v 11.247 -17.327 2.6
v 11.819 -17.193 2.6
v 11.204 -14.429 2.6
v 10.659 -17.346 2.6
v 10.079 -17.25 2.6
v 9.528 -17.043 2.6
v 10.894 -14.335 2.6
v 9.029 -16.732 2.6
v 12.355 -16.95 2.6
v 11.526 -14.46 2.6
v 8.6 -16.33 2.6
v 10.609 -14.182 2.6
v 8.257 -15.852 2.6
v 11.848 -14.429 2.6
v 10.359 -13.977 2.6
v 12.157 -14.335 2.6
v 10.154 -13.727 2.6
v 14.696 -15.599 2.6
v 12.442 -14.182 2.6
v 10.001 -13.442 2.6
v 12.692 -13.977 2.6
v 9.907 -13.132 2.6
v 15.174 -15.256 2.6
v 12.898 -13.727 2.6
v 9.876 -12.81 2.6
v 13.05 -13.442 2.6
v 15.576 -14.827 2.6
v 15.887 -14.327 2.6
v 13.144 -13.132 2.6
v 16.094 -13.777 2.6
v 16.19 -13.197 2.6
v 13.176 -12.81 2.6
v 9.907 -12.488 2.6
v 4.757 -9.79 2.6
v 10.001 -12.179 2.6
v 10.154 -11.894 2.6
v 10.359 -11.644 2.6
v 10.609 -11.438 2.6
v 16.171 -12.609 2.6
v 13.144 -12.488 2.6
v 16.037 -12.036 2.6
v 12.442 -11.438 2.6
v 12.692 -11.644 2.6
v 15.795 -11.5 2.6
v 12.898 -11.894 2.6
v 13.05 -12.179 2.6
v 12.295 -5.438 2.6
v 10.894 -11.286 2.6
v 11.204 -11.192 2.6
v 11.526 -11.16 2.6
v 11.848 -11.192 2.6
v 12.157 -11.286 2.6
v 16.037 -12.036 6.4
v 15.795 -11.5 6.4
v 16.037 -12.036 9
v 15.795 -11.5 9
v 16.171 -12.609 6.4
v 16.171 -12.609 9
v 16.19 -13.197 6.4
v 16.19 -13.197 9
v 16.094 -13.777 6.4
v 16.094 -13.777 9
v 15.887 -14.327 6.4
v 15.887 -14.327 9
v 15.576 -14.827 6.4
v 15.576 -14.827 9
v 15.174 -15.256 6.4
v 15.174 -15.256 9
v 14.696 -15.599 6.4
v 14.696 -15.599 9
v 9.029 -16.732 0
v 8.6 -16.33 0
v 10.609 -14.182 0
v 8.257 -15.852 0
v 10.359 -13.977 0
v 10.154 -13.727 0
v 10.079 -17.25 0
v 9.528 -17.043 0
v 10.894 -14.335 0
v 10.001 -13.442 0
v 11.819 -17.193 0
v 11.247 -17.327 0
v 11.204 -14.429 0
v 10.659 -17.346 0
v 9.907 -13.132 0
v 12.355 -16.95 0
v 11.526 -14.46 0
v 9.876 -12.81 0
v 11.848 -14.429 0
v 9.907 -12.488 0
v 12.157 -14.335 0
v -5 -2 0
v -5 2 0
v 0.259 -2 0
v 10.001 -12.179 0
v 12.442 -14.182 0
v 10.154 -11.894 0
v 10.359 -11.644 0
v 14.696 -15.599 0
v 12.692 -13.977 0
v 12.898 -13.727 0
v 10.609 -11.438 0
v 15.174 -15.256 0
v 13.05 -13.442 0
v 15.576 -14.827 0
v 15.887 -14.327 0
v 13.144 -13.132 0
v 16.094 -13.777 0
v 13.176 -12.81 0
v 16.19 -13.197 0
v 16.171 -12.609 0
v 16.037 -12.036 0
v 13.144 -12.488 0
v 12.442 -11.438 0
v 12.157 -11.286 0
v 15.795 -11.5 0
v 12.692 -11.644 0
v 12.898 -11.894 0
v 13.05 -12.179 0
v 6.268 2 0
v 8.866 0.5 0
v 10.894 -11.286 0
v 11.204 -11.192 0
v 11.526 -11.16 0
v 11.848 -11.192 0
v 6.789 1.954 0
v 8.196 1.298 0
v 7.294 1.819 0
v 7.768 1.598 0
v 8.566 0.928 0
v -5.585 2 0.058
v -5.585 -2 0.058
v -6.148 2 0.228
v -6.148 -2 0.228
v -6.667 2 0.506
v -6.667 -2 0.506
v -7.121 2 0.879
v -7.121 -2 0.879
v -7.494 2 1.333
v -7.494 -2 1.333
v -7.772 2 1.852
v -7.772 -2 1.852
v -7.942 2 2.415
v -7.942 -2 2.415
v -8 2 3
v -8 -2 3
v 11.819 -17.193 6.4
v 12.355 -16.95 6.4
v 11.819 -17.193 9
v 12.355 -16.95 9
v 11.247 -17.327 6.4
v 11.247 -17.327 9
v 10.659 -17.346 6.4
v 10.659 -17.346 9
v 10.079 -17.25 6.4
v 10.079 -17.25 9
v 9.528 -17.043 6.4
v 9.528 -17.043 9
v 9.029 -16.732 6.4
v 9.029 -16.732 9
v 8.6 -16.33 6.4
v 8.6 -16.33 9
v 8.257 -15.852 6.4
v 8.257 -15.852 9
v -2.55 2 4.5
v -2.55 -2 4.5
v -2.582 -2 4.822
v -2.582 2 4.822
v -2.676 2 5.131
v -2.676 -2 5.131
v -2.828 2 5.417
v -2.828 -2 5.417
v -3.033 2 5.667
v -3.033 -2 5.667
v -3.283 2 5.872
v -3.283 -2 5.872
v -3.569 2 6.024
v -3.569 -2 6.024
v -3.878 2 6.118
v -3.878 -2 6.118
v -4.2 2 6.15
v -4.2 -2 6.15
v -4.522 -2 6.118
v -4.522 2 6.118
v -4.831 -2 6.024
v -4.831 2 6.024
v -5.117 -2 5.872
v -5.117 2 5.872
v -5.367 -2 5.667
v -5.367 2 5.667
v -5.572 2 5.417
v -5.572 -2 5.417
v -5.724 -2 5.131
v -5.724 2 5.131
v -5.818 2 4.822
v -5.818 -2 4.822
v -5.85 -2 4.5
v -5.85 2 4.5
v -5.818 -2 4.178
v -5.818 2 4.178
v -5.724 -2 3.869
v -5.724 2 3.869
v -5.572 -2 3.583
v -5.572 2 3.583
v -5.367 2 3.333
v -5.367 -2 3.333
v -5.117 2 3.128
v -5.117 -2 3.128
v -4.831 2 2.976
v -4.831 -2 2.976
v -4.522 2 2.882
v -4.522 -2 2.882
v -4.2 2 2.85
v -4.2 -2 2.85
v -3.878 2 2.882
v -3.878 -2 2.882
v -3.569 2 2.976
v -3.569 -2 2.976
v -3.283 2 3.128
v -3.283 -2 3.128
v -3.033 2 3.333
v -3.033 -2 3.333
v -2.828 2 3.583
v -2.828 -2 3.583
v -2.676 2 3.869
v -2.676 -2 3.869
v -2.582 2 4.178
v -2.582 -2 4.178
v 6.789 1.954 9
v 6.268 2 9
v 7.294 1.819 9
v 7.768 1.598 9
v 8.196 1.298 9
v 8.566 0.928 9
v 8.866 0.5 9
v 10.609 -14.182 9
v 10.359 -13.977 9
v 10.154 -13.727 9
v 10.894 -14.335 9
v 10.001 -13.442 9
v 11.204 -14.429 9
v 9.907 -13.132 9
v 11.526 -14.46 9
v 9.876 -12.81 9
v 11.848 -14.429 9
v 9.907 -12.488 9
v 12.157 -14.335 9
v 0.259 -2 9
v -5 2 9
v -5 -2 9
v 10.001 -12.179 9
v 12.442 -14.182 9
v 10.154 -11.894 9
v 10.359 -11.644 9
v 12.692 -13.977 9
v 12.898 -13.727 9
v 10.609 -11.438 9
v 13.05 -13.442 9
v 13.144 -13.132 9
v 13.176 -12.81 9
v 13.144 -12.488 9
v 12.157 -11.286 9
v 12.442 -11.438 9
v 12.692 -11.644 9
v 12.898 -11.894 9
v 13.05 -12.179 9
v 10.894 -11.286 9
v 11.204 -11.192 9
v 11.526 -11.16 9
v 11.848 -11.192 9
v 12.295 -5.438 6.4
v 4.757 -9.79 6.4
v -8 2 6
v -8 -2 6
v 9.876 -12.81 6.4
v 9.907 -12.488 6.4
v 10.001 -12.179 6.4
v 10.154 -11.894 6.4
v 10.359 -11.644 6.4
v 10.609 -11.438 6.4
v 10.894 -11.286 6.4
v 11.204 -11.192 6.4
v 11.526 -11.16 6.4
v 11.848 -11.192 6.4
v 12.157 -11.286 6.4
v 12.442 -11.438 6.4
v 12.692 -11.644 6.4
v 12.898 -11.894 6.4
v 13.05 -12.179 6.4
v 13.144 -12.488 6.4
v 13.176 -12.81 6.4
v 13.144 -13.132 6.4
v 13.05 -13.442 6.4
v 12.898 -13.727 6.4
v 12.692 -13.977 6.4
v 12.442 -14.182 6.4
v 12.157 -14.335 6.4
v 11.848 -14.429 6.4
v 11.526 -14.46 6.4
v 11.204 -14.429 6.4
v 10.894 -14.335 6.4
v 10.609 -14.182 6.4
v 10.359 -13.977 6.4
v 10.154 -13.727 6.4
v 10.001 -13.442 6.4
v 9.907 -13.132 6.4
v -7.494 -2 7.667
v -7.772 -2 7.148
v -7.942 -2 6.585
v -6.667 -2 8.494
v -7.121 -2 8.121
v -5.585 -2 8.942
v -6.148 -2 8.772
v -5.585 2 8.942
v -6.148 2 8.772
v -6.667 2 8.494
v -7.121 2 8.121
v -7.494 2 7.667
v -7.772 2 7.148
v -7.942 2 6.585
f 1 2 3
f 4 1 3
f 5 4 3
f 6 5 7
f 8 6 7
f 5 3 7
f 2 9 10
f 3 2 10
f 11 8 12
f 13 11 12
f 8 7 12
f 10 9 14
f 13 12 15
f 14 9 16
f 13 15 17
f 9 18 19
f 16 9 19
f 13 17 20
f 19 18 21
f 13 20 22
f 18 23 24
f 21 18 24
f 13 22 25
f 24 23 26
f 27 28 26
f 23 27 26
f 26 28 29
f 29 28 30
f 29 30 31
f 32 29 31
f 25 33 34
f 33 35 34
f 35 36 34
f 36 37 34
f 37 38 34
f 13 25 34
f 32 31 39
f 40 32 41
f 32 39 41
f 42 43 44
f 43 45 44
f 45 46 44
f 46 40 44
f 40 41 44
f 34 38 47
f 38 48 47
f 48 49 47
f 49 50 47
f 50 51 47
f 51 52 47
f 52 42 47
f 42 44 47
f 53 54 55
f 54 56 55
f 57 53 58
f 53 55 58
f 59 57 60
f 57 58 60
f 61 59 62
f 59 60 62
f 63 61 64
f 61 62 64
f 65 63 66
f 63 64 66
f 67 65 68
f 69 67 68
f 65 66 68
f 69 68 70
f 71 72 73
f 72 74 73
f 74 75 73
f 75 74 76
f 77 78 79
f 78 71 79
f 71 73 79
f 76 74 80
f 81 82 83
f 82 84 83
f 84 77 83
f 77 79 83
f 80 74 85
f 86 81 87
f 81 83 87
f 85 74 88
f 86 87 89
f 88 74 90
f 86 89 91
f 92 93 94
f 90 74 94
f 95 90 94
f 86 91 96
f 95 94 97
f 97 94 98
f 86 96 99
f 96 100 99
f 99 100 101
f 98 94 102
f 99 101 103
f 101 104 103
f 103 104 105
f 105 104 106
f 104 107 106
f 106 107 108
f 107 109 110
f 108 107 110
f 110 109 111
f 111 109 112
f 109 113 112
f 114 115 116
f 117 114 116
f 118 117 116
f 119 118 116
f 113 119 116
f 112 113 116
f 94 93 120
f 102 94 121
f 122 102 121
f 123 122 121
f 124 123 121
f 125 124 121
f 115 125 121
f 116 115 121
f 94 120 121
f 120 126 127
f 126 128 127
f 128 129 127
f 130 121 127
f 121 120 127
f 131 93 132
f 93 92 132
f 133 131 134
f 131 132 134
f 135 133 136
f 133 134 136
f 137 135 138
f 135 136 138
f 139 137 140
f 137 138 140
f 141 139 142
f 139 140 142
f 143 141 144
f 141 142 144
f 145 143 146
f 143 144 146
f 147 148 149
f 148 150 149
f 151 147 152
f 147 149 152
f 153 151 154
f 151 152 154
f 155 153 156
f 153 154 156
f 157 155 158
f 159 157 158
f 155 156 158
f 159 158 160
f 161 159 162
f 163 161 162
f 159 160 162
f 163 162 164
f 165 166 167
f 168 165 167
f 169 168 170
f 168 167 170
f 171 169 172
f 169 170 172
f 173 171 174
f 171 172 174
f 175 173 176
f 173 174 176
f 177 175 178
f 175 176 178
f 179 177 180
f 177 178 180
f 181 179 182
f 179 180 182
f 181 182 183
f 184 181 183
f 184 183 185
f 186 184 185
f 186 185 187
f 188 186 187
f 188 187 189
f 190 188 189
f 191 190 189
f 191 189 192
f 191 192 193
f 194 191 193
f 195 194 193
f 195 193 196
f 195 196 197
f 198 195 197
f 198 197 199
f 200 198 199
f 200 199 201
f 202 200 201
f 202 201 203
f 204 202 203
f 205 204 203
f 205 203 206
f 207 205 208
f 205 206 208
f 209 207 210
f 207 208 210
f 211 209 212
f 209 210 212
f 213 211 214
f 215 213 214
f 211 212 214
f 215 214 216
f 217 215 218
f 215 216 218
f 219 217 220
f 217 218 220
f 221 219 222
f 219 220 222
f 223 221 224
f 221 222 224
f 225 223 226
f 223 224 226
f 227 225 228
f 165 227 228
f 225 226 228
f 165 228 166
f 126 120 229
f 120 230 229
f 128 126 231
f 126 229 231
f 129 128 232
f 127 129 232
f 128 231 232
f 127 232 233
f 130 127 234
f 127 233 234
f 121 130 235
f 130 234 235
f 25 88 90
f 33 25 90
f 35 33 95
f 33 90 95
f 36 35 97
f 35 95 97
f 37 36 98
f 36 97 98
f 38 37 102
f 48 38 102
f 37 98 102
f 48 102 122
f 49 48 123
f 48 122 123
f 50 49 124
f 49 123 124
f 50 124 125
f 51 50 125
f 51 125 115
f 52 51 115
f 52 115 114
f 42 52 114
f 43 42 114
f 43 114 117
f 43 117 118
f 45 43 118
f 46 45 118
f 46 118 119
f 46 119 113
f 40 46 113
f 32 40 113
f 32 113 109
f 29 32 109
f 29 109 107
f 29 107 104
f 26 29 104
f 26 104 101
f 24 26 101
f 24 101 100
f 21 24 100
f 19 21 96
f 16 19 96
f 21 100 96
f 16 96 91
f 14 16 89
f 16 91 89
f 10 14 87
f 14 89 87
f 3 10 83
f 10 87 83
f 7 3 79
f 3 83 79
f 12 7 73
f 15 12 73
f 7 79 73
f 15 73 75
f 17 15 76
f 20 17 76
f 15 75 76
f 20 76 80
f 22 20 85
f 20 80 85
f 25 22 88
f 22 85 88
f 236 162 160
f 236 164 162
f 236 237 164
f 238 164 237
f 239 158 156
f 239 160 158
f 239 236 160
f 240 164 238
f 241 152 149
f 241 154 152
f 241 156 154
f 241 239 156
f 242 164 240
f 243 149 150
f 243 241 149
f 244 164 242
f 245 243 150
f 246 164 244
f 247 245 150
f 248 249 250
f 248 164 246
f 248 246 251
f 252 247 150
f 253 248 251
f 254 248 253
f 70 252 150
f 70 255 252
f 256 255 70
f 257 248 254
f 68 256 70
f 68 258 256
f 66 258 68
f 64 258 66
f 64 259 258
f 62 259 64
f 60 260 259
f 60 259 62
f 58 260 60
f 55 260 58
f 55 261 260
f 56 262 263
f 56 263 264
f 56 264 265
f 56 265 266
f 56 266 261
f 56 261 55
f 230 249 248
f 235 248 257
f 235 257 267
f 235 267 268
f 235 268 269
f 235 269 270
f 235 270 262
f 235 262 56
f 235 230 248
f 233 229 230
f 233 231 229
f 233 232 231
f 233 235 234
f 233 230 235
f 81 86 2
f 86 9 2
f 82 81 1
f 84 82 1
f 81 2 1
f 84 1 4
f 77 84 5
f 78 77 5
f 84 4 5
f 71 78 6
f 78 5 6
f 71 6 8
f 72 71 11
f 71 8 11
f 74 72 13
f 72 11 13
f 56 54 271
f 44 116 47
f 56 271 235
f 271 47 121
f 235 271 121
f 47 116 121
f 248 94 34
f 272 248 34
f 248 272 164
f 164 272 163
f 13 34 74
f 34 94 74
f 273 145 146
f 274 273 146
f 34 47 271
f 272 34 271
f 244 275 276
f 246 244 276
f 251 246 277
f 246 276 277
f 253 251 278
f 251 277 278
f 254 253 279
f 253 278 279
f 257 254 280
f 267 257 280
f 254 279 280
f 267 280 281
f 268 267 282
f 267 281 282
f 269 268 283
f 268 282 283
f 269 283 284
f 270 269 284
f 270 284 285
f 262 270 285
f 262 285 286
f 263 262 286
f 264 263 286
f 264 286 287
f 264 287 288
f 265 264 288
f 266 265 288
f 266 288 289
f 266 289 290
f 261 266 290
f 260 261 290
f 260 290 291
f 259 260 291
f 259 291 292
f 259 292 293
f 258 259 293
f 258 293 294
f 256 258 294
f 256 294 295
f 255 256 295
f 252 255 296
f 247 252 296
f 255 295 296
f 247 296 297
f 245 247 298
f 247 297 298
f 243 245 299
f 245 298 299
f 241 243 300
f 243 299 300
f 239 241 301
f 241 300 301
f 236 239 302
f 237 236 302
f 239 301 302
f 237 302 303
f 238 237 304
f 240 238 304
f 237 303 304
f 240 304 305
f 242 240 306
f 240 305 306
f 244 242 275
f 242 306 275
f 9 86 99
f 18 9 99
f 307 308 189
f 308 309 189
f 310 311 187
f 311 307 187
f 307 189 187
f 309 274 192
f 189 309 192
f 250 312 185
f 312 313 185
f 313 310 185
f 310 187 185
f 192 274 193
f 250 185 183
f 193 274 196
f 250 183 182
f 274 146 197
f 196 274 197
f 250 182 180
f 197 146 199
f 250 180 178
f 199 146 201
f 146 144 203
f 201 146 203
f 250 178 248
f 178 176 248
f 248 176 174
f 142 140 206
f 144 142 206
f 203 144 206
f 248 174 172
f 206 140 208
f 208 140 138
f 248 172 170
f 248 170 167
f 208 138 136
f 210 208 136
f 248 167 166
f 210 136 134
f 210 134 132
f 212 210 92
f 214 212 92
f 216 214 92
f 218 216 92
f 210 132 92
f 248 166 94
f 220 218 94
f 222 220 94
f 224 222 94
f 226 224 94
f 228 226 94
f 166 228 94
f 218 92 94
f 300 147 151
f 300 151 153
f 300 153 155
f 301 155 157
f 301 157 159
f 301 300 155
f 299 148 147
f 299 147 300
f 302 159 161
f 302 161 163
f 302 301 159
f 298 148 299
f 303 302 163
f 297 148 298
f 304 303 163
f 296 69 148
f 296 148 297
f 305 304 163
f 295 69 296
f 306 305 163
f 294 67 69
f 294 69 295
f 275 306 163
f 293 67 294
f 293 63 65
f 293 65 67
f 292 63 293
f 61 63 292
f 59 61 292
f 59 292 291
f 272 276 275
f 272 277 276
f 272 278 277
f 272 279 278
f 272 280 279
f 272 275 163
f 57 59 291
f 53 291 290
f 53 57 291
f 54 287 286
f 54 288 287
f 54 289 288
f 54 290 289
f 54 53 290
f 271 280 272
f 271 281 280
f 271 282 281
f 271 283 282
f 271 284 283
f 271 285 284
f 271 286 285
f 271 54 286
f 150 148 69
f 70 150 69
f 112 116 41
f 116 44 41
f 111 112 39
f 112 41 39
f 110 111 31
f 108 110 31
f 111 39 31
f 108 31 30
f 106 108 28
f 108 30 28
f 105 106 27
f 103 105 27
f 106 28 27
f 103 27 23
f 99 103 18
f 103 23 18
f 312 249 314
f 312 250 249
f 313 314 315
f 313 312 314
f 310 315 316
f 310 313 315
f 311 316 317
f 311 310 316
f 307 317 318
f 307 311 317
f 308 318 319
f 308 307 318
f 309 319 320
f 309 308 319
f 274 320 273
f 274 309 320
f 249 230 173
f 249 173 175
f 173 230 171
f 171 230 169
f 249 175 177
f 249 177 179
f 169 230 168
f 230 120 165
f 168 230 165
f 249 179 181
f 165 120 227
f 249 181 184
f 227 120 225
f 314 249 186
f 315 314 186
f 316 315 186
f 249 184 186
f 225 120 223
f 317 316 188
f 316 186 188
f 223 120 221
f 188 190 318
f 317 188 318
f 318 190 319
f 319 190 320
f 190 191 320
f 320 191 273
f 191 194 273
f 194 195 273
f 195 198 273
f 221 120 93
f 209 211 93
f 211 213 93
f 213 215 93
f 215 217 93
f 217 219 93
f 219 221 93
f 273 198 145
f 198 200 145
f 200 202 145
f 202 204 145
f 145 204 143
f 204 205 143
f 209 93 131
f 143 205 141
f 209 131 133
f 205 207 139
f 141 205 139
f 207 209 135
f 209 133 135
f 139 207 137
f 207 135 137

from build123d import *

# Parameters (mm, degrees)
F1_DEPTH = 9
F3_W     = 20
F3_H     = 3.8
F4_DEPTH = 25
F6_D     = 3.3
F7_D     = 3.3
F8_R     = 3


with BuildPart() as f1:
    # F0 (on Top) → F1 (new body)
    with BuildSketch(Plane.XY):
        Polygon((8, 2), (-8, 2), (-8, -2), (0.259353, -2), (9.756975, -18.450364), (17.294511, -14.098566), align=None)
    extrude(amount=F1_DEPTH)

    # F3 (on face) → F4 (cut)
    with BuildSketch(Plane(origin=(6.866025, 3.964102, 0), x_dir=(-0.5, 0.866025, 0), z_dir=(0.866025, 0.5, 0))):
        with Locations((-20.856972, 4.5)):
            Rectangle(F3_W, F3_H)
    extrude(amount=-F4_DEPTH, mode=Mode.SUBTRACT)

    # F6 (through all)
    with Locations(Plane.XY.offset(9)):
        with Locations((11.525743, -12.810364)):
            Hole(F6_D / 2)

    # F7 (through all)
    with Locations(Plane(origin=(0, 2, 0), x_dir=(-1, 0, 0), z_dir=(0, 1, 0))):
        with Locations((4.2, 4.5)):
            Hole(F7_D / 2)

    # F8
    f8_edges = [f1.edges().sort_by_distance(p)[0] for p in [
        (-8, 0, 9),
        (-8, 0, 0),
        (8, 2, 4.5),
        (17.294511, -14.098566, 7.7),
        (17.294511, -14.098566, 1.3),
        (9.756975, -18.450364, 7.7),
        (9.756975, -18.450364, 1.3),
    ]]
    fillet(f8_edges, radius=F8_R)


solid = f1.part
